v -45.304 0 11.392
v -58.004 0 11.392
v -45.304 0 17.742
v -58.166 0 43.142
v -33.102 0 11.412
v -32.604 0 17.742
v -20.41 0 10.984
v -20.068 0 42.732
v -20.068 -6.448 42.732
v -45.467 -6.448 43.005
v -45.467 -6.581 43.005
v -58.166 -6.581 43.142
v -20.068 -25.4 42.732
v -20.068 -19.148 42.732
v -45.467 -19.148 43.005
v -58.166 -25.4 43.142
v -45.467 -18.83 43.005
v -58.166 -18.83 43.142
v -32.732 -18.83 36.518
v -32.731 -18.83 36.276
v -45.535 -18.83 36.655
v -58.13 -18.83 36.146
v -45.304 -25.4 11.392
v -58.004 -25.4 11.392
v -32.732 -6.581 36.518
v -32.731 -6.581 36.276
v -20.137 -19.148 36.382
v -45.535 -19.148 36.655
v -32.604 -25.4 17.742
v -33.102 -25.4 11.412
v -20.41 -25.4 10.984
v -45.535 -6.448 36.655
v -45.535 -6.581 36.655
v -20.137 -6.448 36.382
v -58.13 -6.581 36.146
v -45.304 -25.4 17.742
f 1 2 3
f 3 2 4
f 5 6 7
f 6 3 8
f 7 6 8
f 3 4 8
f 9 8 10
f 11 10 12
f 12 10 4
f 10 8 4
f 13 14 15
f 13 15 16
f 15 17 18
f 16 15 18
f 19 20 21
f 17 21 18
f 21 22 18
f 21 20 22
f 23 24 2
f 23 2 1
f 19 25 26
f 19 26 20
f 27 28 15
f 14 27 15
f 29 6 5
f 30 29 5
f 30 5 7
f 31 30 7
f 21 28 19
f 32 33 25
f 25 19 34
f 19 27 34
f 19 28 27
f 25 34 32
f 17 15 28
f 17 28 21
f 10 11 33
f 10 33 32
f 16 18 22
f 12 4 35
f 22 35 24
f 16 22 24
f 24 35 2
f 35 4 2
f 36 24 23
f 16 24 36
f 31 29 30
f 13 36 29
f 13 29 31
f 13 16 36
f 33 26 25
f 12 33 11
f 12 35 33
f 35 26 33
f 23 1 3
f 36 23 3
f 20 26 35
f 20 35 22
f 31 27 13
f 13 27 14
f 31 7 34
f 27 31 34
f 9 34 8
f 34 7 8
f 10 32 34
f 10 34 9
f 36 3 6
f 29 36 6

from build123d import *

# Parameters (mm, degrees)
F1_DEPTH = 25.4
F2_W     = 12.2484653257
F2_H     = 6.995950315
F3_DEPTH = 25.4
F4_W     = 12.7
F4_H     = 6.35
F5_DEPTH = 25.4


with BuildPart() as f1:
    # F0 (on Front) → F1 (new body)
    with BuildSketch(Plane.XZ):
        Polygon((-58.1661015928, 43.1416464728), (-58.0037304439, 11.3920616628), (-45.3037304439, 11.3920616628), (-45.3037304439, 17.7420616628), (-32.6037304439, 17.7420616628), (-33.1024721118, 11.411678045), (-20.4096810303, 10.9838292846), (-20.0683039551, 42.7319939826), align=None)
    extrude(amount=F1_DEPTH)

    # F2 (on face) → F3 (cut)
    with BuildSketch(Plane(origin=(-57.9439546086, 0, -0.2963322682), x_dir=(0, -1, 0), z_dir=(-0.9999869232, 0, -0.0051140519))):
        with Locations((12.7056662459, 39.9405716228)):
            Rectangle(F2_W, F2_H)
    extrude(amount=-F3_DEPTH, mode=Mode.SUBTRACT)

    # F4 (on face) → F5 (cut)
    with BuildSketch(Plane(origin=(-20.5254132218, 0, 0.2207026957), x_dir=(0, 1, 0), z_dir=(0.9999421952, 0, -0.0107520339))):
        with Locations((-12.7976922482, 39.338748785)):
            Rectangle(F4_W, F4_H)
    extrude(amount=-F5_DEPTH, mode=Mode.SUBTRACT)


solid = f1.part
